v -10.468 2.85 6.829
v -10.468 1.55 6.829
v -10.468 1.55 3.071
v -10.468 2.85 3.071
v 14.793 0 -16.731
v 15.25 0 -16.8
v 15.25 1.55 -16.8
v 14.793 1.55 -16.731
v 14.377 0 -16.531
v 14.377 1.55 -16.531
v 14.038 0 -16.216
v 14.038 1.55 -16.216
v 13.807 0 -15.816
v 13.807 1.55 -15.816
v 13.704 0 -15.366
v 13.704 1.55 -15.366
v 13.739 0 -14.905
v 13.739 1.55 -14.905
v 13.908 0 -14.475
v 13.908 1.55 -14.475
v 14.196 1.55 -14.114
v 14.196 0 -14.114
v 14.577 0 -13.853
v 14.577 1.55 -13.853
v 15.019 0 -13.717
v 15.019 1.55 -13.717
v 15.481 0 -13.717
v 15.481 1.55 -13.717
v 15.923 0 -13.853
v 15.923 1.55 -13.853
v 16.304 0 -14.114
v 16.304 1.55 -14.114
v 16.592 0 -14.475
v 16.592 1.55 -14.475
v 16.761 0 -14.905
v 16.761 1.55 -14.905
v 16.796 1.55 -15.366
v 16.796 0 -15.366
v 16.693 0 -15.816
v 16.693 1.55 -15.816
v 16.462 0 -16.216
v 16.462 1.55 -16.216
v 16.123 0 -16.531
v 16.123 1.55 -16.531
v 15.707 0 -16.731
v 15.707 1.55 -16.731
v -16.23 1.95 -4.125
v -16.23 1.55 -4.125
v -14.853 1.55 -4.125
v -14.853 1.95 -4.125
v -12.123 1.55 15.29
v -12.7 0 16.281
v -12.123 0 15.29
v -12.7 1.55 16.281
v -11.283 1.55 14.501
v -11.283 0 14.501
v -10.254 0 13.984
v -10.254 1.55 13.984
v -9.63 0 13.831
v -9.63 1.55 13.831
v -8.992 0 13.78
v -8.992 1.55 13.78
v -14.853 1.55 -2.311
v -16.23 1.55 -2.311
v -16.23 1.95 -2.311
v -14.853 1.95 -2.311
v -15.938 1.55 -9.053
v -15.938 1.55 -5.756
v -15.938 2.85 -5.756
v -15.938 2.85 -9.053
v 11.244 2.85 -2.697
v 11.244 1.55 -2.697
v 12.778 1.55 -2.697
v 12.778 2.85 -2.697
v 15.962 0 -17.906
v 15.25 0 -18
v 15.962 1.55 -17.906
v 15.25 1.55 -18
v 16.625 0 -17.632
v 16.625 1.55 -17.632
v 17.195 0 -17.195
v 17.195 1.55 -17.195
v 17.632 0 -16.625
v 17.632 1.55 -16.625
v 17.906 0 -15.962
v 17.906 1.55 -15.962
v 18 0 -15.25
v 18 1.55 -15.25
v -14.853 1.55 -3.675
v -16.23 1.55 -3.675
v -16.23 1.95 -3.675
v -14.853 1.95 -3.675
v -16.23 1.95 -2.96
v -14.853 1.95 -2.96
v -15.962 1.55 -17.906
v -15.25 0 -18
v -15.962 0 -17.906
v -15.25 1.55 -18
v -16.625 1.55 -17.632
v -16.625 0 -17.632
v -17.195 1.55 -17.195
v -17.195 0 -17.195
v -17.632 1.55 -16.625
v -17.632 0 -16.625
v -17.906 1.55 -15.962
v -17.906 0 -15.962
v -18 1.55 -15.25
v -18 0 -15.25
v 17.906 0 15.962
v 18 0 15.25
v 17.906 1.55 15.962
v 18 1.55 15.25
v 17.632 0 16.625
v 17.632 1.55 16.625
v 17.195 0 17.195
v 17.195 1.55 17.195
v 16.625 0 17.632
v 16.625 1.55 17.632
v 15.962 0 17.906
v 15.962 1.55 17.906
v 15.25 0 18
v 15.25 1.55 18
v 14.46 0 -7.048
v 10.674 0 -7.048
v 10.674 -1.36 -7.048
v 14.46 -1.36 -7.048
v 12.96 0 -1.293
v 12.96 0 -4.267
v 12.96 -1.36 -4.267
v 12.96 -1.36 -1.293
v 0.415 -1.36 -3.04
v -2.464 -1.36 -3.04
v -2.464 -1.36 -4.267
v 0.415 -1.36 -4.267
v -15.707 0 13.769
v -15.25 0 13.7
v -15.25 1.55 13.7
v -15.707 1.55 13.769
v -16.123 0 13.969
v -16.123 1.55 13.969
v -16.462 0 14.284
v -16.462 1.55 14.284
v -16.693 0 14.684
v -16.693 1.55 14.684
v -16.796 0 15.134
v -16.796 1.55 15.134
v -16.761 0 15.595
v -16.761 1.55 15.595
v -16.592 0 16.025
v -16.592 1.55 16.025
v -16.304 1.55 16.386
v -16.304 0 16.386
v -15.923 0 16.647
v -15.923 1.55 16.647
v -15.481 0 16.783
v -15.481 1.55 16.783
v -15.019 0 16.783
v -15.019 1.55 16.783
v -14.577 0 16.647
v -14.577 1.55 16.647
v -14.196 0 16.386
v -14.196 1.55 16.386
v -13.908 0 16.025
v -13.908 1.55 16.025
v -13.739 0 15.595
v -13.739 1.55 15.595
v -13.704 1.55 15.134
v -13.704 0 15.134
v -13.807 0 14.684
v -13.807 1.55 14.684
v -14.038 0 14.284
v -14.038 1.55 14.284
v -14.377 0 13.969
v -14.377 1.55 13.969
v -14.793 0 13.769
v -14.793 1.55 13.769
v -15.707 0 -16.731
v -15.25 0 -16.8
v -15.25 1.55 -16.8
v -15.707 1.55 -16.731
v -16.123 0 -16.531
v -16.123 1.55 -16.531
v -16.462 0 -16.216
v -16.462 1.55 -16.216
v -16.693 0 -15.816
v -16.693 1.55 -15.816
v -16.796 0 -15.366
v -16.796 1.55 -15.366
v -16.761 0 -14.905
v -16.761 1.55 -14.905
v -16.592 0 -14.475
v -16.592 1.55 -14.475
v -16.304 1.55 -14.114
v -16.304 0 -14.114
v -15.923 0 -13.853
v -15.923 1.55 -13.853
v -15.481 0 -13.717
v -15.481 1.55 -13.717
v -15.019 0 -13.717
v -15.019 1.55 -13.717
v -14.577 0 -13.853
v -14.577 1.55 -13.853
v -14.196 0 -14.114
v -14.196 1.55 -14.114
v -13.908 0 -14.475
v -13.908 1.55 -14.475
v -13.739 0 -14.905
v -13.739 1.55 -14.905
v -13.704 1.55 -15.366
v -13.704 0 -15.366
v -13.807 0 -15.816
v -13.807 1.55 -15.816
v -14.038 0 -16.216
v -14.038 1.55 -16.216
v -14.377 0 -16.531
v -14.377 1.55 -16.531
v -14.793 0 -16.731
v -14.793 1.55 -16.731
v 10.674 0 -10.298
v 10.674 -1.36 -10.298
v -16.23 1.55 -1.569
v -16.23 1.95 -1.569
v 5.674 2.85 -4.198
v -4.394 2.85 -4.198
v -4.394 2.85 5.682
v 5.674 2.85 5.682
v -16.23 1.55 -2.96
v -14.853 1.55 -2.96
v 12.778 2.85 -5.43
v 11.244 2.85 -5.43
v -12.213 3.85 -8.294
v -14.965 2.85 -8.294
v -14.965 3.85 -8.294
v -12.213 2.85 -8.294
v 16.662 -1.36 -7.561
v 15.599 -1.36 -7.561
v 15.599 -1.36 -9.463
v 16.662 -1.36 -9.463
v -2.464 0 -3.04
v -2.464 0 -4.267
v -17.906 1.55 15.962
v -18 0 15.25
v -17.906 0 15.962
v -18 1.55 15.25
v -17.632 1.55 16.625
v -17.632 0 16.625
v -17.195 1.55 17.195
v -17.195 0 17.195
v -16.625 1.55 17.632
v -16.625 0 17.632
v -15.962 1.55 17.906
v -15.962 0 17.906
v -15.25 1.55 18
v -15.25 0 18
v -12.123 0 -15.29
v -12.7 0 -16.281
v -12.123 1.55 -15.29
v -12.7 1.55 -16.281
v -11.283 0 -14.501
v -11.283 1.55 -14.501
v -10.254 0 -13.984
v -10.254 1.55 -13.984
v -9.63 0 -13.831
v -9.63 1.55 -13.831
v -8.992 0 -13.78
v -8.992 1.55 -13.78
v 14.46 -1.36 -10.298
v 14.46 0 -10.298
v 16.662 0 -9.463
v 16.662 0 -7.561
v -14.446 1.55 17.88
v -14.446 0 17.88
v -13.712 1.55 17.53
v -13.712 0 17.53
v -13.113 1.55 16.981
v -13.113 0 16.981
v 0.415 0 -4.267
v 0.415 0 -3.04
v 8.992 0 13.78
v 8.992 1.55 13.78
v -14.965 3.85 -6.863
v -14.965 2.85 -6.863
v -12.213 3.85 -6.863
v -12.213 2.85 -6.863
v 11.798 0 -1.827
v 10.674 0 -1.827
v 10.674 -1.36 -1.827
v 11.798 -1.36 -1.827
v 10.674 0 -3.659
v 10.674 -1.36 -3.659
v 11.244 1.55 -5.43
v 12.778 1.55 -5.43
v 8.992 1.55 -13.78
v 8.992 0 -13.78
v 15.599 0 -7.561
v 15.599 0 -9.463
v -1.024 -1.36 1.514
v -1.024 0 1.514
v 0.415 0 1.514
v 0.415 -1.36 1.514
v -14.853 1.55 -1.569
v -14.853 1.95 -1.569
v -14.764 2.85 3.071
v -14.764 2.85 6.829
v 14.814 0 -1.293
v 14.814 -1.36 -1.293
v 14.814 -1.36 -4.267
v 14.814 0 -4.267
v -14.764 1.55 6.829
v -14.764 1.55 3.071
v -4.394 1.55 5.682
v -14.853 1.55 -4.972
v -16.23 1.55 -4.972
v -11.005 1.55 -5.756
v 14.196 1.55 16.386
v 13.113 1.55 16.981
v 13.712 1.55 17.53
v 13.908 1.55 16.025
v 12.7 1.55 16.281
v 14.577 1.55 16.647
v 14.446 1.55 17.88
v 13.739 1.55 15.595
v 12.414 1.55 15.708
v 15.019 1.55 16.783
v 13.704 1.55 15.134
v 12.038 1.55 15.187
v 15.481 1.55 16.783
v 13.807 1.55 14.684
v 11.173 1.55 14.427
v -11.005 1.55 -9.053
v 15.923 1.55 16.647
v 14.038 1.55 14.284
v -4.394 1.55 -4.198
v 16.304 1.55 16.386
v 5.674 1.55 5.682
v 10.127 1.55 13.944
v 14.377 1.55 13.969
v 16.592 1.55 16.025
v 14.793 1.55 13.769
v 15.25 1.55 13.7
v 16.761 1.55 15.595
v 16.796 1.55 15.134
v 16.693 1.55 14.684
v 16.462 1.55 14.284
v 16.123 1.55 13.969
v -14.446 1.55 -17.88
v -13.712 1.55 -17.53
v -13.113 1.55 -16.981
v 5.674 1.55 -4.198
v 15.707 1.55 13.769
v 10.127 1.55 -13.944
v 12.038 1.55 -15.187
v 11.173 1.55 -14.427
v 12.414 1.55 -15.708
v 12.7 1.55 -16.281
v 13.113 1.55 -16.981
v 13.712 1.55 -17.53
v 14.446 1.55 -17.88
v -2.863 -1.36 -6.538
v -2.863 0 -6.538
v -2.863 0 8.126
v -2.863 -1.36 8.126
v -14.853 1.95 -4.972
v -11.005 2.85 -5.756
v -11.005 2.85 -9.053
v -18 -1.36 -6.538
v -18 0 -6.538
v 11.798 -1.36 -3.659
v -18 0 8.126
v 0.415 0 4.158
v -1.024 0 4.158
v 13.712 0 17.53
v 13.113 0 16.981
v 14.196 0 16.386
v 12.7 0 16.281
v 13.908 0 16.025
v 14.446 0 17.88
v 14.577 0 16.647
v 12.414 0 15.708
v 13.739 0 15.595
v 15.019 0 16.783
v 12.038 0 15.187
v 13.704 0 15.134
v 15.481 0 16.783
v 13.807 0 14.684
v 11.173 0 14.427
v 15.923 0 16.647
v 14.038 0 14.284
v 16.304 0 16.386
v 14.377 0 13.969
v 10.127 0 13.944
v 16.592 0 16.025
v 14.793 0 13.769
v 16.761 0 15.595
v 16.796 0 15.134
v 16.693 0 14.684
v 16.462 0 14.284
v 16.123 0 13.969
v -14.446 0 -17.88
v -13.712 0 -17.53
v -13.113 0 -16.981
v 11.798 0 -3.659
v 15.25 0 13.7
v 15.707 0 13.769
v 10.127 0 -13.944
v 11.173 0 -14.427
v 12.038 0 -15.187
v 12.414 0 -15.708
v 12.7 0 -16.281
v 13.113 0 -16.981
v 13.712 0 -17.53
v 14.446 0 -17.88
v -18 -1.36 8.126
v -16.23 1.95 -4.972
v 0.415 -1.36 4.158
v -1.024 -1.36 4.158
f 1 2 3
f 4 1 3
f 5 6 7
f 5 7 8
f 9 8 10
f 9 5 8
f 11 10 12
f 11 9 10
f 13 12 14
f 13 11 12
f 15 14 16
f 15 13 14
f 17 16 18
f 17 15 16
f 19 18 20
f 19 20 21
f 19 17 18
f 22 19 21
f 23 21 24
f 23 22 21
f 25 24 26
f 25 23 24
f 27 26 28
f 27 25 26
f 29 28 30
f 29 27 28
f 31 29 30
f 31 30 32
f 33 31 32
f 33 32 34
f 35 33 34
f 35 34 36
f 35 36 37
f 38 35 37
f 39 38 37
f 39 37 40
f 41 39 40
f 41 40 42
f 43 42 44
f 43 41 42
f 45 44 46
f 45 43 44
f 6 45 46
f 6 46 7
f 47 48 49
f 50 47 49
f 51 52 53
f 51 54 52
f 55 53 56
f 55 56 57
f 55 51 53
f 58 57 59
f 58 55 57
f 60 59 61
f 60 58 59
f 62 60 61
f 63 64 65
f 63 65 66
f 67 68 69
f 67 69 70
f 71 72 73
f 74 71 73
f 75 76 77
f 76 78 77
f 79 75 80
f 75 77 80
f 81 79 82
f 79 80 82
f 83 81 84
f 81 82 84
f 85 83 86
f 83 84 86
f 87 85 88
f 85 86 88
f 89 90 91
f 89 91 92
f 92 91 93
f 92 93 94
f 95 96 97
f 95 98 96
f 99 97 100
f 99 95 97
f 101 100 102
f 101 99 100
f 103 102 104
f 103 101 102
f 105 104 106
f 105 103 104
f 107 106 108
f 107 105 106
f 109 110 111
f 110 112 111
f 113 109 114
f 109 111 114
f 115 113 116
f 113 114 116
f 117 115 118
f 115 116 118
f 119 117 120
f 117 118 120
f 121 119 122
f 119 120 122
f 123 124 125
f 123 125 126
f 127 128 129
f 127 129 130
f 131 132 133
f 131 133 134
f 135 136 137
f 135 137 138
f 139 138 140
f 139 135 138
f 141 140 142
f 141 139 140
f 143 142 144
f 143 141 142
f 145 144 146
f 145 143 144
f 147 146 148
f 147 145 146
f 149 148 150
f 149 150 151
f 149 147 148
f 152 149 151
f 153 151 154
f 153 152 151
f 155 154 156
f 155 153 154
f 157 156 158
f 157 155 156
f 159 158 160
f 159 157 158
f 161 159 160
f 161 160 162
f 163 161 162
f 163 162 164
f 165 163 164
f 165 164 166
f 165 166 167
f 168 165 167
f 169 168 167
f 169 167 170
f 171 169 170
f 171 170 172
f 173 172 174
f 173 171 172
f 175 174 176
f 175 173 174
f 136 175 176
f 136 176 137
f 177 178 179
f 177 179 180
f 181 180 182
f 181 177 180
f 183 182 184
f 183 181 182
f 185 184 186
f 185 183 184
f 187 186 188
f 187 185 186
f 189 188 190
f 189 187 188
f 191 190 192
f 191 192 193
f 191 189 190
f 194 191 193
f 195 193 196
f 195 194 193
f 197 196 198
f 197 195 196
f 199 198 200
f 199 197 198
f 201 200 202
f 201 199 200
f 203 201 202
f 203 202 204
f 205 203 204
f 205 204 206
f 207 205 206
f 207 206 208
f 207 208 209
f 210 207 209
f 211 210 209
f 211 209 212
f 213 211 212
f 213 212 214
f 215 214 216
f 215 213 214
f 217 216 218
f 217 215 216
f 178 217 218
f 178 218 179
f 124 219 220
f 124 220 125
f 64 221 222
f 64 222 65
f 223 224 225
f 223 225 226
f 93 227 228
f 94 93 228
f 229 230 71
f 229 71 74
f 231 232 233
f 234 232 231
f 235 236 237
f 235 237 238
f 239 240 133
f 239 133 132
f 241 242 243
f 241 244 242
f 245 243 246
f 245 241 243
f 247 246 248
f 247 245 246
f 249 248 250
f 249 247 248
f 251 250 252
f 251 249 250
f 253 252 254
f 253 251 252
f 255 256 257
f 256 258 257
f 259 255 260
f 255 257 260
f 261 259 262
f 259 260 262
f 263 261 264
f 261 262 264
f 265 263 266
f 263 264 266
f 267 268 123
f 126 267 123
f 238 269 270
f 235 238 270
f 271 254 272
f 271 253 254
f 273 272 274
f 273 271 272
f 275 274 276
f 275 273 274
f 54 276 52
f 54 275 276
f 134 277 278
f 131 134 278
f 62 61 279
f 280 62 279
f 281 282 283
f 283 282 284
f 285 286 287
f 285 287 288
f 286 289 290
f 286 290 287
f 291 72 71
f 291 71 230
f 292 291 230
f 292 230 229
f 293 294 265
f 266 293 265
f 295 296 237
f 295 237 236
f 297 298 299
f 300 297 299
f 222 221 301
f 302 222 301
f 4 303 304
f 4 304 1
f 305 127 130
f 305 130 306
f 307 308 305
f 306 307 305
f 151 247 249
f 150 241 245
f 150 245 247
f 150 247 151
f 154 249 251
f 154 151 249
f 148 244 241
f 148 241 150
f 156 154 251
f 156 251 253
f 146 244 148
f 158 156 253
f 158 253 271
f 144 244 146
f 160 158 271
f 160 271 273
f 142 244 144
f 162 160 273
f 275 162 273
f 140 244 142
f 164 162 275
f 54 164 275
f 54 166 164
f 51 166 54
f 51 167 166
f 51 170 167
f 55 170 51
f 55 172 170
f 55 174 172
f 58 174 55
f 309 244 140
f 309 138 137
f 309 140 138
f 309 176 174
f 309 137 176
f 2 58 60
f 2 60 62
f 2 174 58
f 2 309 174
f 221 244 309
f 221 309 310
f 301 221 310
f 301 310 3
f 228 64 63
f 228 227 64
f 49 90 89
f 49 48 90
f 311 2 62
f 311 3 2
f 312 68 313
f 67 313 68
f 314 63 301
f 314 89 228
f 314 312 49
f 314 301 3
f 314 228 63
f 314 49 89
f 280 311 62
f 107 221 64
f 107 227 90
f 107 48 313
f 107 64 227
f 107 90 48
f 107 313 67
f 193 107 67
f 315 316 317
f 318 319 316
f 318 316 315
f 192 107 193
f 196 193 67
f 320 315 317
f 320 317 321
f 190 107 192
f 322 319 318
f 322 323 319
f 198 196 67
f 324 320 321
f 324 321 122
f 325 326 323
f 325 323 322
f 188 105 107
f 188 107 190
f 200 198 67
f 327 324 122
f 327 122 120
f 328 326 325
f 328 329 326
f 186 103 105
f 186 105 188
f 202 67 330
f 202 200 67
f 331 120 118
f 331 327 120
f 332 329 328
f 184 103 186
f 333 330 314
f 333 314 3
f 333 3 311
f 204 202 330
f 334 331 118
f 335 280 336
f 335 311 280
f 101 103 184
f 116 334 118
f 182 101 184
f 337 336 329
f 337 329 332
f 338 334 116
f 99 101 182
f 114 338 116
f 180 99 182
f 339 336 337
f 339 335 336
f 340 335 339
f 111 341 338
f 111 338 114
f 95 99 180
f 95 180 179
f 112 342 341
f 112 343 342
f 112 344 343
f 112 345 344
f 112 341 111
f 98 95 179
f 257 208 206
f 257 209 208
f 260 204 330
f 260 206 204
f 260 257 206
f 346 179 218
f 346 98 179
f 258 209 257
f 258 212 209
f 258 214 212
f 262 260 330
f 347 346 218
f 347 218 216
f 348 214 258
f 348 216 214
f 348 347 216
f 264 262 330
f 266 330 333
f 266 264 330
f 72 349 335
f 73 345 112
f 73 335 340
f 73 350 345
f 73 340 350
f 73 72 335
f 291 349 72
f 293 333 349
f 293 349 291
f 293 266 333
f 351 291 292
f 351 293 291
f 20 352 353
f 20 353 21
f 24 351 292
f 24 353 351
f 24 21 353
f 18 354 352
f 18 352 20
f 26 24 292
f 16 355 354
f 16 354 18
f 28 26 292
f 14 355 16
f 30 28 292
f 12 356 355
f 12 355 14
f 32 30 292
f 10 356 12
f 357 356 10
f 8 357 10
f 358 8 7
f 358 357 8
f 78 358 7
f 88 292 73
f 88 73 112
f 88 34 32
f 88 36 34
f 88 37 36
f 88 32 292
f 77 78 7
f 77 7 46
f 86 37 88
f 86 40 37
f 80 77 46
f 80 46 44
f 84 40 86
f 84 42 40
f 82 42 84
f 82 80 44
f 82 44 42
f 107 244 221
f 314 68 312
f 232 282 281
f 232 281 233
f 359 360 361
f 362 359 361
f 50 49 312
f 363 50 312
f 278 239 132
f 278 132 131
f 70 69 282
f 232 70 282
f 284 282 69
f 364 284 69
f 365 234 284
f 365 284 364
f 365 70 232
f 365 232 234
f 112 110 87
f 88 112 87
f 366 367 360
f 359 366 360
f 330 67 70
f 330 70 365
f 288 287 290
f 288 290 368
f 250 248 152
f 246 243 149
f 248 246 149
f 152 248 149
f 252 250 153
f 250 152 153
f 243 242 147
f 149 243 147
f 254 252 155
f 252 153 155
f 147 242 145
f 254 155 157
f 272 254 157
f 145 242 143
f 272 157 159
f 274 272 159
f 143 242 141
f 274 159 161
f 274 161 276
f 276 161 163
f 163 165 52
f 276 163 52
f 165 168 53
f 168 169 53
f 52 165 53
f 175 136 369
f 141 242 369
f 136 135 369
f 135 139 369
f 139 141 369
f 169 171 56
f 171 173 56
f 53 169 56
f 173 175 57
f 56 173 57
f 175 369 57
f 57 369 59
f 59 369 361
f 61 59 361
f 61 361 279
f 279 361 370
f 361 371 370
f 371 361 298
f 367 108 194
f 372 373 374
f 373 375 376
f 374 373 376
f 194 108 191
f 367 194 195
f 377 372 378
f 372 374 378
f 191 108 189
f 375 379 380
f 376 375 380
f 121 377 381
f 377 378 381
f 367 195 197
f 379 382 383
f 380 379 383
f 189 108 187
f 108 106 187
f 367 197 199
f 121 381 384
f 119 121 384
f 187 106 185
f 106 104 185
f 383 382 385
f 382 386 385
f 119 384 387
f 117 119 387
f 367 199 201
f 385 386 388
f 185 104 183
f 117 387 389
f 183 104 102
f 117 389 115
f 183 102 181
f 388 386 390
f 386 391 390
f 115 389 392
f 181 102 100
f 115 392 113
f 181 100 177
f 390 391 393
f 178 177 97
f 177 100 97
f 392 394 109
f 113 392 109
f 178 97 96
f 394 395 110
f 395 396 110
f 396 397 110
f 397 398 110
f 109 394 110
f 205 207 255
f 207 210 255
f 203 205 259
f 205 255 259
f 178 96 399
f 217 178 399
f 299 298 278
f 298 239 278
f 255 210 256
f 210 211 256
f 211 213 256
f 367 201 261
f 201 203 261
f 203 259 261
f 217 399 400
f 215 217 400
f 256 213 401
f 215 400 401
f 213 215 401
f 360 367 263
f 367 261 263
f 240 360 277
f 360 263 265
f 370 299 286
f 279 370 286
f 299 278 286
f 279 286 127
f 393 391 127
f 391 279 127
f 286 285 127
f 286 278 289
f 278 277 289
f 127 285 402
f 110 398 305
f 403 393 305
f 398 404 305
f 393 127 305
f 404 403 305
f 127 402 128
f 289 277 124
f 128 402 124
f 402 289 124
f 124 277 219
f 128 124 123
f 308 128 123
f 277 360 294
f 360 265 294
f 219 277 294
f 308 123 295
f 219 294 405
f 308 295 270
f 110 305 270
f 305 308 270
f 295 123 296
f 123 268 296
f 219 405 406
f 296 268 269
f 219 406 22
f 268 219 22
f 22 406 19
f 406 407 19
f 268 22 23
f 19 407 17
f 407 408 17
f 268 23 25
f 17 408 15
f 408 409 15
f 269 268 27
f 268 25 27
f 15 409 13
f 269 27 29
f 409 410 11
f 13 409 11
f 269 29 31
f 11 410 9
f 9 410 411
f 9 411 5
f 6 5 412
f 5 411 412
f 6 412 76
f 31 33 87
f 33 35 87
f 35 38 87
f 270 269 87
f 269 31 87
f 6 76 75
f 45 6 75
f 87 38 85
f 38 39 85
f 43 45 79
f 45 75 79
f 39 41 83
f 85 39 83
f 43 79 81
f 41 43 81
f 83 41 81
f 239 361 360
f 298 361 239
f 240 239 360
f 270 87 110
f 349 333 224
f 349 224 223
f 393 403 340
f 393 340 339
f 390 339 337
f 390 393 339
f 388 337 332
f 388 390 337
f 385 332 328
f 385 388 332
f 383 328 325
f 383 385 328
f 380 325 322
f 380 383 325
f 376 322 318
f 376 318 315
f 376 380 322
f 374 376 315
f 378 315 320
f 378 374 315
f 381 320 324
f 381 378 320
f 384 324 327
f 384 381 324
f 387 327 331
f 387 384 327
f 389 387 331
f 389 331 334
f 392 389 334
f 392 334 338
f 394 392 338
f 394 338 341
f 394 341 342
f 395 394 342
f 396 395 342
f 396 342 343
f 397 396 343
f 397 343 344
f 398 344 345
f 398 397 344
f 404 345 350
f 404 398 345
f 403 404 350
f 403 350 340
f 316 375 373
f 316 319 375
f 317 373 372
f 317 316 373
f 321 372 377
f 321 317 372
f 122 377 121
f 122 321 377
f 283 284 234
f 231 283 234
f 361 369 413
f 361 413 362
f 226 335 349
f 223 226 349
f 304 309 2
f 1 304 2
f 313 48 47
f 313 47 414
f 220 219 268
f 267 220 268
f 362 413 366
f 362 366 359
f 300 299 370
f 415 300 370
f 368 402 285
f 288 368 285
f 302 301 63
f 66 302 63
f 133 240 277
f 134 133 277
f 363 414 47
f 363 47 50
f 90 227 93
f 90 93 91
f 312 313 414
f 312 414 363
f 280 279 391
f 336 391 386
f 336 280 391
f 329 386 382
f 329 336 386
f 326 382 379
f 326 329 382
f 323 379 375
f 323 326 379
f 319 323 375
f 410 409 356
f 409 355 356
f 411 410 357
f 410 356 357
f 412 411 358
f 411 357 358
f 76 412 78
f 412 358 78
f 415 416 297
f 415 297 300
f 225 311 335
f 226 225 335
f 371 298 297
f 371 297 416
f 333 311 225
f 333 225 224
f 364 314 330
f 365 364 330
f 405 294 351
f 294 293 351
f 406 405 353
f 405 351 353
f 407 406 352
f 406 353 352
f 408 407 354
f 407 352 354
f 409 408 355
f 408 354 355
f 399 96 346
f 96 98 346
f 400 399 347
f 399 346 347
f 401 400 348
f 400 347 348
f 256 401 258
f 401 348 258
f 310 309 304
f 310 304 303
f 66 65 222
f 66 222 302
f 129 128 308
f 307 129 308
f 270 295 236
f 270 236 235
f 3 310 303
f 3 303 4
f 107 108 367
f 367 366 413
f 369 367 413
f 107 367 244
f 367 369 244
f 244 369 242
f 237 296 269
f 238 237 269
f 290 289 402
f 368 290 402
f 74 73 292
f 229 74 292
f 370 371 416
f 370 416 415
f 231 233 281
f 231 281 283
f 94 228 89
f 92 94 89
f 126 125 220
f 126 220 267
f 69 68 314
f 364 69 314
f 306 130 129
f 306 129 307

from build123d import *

# Parameters (mm, degrees)
SKETCH1_R           = 1.55
BOSS_EXTRUDE1_DEPTH = 1.55
FILLET1_R           = 2.75
FILLET2_R           = 4
SKETCH2_W           = 4.295601851
SKETCH2_H           = 3.758651621
SKETCH2_W_2         = 10.067816841
SKETCH2_H_2         = 9.880137001
SKETCH2_W_3         = 1.533271648
SKETCH2_H_3         = 2.732965052
SKETCH2_W_4         = 4.933230252
SKETCH2_H_4         = 3.296205995
BOSS_EXTRUDE2_DEPTH = 1.3
SKETCH3_W           = 2.751869936
SKETCH3_H           = 1.431170206
BOSS_EXTRUDE3_DEPTH = 1
SKETCH5_W           = 15.136693504
SKETCH5_H           = 14.663476204
SKETCH5_W_2         = 3.786204625
SKETCH5_H_2         = 3.249978942
SKETCH5_W_3         = 1.854200636
SKETCH5_H_3         = 2.974253985
SKETCH5_W_4         = 1.124105555
SKETCH5_H_4         = 1.832284905
SKETCH5_W_5         = 2.879214045
SKETCH5_H_5         = 1.227517325
SKETCH5_W_6         = 1.439607023
SKETCH5_H_6         = 2.644088496
SKETCH5_W_7         = 1.062909192
SKETCH5_H_7         = 1.901844146
BOSS_EXTRUDE5_DEPTH = 1.36
SKETCH6_W           = 1.377049396
SKETCH6_H           = 0.847415013
SKETCH6_H_2         = 0.715006417
SKETCH6_H_3         = 0.741488137
LED_DEPTH           = 0.4


with BuildPart() as part:
    # Sketch1 → Boss-Extrude1 (new body)
    with BuildSketch(Plane(origin=(0, 0, 0), x_dir=(1, 0, 0), z_dir=(0, 1, 0))):
        Polygon((-12.5, 18), (-18, 18), (-18, -18), (-12.5, -18), (-12.5, -13.78), (12.5, -13.78), (12.5, -18), (18, -18), (18, 18), (12.5, 18), (12.5, 13.78), (-12.5, 13.78), align=None)
        with Locations(Location((-15.25, -15.25, 0), (0, 0, 90))):
            Circle(SKETCH1_R, mode=Mode.SUBTRACT)
        with Locations(Location((15.25, -15.25, 0), (0, 0, 90))):
            Circle(SKETCH1_R, mode=Mode.SUBTRACT)
        with Locations(Location((-15.25, 15.25, 0), (0, 0, 90))):
            Circle(SKETCH1_R, mode=Mode.SUBTRACT)
        with Locations(Location((15.25, 15.25, 0), (0, 0, 90))):
            Circle(SKETCH1_R, mode=Mode.SUBTRACT)
    extrude(amount=BOSS_EXTRUDE1_DEPTH)

    # Fillet1
    fillet1_edges = [part.edges().sort_by_distance(p)[0] for p in [
        (-12.5, 0.775, -18),
        (-18, 0.775, -18),
        (-18, 0.775, 18),
        (-12.5, 0.775, 18),
        (12.5, 0.775, 18),
        (18, 0.775, 18),
        (18, 0.775, -18),
        (12.5, 0.775, -18),
    ]]
    fillet(fillet1_edges, radius=FILLET1_R - 0.0001)  # a hair under: the kernel refuses the full size

    # Fillet2
    fillet2_edges = [part.edges().sort_by_distance(p)[0] for p in [
        (12.5, 0.775, -13.78),
        (-12.5, 0.775, -13.78),
        (12.5, 0.775, 13.78),
        (-12.5, 0.775, 13.78),
    ]]
    fillet(fillet2_edges, radius=FILLET2_R)

    # Sketch2 → Boss-Extrude2 (add)
    with BuildSketch(Plane(origin=(0, 1.55, 0), x_dir=(1, 0, 0), z_dir=(0, 1, 0))):
        with Locations((-12.61578846, -4.950009947)):
            Rectangle(SKETCH2_W, SKETCH2_H)
        with Locations((0.64017038, -0.742248111)):
            Rectangle(SKETCH2_W_2, SKETCH2_H_2)
        with Locations((12.011098572, 4.06360308)):
            Rectangle(SKETCH2_W_3, SKETCH2_H_3)
        with Locations((-13.471552891, 7.404508181)):
            Rectangle(SKETCH2_W_4, SKETCH2_H_4)
    extrude(amount=BOSS_EXTRUDE2_DEPTH)

    # Sketch3 → Boss-Extrude3 (add)
    with BuildSketch(Plane(origin=(0, 2.85, 0), x_dir=(1, 0, 0), z_dir=(0, 1, 0))):
        with Locations((-13.589010754, 7.578480249)):
            Rectangle(SKETCH3_W, SKETCH3_H)
    extrude(amount=BOSS_EXTRUDE3_DEPTH)

    # Sketch5 → Boss-Extrude5 (add)
    with BuildSketch(Plane.XZ):
        with Locations((-10.431653248, 0.794028878)):
            Rectangle(SKETCH5_W, SKETCH5_H)
        with Locations((12.566755317, -8.673138409)):
            Rectangle(SKETCH5_W_2, SKETCH5_H_2)
        with Locations((13.887030707, -2.780074404)):
            Rectangle(SKETCH5_W_3, SKETCH5_H_3)
        with Locations((11.235705782, -2.742909061)):
            Rectangle(SKETCH5_W_4, SKETCH5_H_4)
        with Locations((-1.024391328, -3.653442734)):
            Rectangle(SKETCH5_W_5, SKETCH5_H_5)
        with Locations((-0.304587816, 2.835875505)):
            Rectangle(SKETCH5_W_6, SKETCH5_H_6)
        with Locations((16.130877107, -8.512116058)):
            Rectangle(SKETCH5_W_7, SKETCH5_H_7)
    extrude(amount=BOSS_EXTRUDE5_DEPTH)

    # Sketch6 → LED (add)
    with BuildSketch(Plane(origin=(0, 1.55, 0), x_dir=(1, 0, 0), z_dir=(0, 1, 0))):
        with Locations((-15.541502651, 4.54846251)):
            Rectangle(SKETCH6_W, SKETCH6_H)
        with Locations((-15.541502651, 3.317062568)):
            Rectangle(SKETCH6_W, SKETCH6_H_2)
        with Locations((-15.541502651, 1.940013173)):
            Rectangle(SKETCH6_W, SKETCH6_H_3)
    extrude(amount=LED_DEPTH)


solid = part.part
